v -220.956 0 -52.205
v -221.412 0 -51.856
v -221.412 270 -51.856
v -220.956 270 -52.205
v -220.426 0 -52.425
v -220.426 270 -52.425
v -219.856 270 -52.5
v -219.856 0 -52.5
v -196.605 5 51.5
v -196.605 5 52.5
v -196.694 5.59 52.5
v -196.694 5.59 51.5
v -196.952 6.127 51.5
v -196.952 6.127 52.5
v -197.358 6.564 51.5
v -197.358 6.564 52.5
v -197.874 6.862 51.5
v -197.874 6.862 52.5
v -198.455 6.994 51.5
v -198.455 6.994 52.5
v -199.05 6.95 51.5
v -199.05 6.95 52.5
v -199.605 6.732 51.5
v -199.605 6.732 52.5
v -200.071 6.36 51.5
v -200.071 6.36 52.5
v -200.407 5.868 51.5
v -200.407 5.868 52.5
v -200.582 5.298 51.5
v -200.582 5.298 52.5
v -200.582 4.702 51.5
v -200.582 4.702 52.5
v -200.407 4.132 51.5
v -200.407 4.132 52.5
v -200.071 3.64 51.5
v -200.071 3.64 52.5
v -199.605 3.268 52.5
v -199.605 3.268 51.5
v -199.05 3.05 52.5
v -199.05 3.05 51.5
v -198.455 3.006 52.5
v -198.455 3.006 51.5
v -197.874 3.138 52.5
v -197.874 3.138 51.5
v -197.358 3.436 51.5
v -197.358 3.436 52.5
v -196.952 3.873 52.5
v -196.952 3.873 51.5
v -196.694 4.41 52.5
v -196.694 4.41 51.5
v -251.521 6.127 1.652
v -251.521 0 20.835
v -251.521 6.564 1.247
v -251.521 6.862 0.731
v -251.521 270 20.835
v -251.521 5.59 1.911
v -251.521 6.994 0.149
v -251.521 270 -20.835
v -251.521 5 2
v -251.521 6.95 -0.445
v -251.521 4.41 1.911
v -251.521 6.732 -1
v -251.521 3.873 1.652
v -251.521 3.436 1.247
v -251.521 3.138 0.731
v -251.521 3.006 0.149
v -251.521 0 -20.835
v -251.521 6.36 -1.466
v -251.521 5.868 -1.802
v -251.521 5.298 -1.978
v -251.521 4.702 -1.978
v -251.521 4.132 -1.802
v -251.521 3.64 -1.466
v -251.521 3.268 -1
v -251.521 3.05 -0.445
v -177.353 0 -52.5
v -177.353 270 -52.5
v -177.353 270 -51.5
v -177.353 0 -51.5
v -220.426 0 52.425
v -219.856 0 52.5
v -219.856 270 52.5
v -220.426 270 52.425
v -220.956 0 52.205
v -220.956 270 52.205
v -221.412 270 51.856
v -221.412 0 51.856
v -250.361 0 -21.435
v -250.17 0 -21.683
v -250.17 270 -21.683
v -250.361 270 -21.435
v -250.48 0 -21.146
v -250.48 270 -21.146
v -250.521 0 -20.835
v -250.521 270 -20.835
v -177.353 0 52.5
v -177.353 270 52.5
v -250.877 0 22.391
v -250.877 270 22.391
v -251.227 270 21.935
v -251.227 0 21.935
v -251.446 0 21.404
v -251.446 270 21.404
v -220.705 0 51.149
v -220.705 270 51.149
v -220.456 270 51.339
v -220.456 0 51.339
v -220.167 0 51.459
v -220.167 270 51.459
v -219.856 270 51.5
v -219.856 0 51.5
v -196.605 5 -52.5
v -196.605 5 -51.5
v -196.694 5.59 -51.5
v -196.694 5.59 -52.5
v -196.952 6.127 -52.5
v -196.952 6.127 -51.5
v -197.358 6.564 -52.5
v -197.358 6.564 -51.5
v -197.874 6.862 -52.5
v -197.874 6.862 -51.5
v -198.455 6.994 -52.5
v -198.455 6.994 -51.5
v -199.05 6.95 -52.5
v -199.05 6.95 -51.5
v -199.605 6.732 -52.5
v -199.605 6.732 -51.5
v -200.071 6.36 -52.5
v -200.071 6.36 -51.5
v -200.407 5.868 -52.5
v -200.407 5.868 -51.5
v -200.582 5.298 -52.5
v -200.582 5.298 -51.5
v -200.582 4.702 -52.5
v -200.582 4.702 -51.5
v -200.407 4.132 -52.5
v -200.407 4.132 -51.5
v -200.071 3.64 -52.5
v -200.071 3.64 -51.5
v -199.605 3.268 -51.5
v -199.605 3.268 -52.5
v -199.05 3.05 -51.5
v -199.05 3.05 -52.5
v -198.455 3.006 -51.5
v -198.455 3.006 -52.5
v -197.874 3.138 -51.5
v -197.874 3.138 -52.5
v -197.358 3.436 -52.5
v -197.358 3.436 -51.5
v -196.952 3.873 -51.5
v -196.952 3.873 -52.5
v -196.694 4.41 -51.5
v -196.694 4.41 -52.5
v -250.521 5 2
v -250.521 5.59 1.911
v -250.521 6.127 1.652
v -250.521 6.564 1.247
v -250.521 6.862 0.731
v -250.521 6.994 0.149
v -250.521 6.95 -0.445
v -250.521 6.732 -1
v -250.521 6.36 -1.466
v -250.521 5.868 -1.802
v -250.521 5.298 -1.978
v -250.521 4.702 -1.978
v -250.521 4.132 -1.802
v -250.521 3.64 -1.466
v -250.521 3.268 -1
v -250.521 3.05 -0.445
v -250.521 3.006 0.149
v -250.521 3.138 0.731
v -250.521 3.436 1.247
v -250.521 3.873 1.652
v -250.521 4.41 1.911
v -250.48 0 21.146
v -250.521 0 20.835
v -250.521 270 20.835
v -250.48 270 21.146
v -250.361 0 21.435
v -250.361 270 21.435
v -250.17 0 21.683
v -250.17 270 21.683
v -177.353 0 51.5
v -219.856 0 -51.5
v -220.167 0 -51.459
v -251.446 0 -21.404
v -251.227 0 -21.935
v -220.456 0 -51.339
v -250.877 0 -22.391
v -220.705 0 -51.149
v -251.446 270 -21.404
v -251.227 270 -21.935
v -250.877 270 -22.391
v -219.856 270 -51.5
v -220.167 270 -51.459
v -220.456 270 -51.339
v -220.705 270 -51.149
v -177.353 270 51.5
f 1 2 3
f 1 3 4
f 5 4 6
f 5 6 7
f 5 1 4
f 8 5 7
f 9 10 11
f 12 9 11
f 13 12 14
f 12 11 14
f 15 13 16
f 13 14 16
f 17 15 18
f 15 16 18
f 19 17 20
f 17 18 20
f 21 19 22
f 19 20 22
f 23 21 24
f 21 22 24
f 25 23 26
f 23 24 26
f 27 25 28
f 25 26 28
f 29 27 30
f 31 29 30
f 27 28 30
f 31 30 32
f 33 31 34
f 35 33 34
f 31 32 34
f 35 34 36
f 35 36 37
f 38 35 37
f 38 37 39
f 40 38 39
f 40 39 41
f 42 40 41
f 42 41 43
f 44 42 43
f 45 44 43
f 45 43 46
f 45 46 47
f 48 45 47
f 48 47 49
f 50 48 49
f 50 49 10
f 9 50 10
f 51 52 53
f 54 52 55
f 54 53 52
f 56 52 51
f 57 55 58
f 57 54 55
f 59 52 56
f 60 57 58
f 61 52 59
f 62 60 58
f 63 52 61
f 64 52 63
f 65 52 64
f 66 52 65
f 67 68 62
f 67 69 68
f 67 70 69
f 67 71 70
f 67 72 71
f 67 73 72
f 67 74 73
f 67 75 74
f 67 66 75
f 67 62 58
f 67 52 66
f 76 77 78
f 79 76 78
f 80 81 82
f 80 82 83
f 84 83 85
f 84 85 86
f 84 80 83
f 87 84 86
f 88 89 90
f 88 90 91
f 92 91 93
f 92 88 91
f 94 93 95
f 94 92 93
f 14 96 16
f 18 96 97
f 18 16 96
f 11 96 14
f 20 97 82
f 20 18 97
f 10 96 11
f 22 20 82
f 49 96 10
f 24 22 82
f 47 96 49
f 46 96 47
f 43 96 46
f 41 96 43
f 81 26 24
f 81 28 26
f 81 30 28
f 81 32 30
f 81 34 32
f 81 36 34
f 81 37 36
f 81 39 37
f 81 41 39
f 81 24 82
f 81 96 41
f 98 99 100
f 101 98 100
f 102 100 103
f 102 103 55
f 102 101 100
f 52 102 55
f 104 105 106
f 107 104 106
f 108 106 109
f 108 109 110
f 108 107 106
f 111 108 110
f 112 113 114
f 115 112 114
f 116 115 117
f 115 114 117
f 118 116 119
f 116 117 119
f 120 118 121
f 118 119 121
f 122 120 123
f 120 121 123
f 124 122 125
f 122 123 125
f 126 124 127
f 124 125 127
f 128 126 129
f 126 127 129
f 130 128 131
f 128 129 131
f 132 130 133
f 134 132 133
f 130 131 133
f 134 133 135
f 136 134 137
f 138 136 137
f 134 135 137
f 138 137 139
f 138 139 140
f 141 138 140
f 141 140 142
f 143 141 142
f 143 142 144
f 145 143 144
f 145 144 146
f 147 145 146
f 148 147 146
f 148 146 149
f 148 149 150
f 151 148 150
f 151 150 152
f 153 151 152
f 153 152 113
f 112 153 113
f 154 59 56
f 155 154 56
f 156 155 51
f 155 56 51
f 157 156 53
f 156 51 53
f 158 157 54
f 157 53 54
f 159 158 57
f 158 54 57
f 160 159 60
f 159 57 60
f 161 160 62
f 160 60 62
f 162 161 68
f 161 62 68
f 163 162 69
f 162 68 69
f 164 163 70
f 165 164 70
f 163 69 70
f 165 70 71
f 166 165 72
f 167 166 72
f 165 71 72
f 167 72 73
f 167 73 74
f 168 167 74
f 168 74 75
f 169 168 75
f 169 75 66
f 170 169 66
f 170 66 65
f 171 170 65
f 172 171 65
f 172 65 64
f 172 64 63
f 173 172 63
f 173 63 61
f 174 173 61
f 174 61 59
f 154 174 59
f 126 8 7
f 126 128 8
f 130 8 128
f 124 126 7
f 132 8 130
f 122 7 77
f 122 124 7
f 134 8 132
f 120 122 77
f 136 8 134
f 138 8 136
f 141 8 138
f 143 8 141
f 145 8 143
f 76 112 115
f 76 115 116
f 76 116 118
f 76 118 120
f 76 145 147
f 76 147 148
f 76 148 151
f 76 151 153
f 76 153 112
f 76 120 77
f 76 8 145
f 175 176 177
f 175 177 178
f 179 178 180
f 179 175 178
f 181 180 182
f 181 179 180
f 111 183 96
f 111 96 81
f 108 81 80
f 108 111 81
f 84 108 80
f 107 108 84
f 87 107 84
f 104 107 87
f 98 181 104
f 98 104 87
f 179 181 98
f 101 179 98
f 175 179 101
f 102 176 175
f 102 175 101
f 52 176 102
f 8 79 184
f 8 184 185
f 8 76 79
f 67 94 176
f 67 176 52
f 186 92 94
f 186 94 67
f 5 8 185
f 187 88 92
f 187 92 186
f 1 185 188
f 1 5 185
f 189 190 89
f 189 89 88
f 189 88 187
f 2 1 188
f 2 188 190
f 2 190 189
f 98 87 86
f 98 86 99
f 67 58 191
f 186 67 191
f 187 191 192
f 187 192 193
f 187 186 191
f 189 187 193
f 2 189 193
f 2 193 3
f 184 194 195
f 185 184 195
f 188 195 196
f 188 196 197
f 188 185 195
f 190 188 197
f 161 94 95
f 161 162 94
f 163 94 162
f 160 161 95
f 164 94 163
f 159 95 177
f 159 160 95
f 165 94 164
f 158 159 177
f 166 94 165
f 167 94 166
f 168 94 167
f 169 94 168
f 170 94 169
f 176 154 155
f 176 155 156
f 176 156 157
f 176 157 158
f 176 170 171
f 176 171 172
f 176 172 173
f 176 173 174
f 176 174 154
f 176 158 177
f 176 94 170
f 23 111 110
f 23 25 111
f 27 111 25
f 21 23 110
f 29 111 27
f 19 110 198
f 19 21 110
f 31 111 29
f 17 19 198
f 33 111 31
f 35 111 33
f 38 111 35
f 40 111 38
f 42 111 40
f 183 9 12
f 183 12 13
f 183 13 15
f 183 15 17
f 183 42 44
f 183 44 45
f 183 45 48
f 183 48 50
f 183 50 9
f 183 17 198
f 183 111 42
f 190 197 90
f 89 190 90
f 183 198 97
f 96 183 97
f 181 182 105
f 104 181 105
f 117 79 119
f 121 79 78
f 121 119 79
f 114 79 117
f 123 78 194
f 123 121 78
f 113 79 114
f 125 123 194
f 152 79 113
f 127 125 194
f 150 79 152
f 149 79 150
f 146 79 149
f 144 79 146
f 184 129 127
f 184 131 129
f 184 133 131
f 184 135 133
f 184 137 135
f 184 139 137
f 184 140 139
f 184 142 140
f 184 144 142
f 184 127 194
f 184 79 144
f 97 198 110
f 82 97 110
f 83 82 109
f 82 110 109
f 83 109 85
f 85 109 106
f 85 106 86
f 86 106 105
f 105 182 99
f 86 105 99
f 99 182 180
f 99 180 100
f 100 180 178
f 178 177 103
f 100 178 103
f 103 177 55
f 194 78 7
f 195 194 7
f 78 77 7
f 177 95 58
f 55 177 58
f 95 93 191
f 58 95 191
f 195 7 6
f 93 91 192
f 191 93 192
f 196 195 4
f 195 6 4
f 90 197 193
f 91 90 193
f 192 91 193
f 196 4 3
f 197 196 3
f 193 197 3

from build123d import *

# Parameters (mm, degrees)
SM_BASE_FLANGE_1_DEPTH = 270
SKETCH_2_R             = 2
CUT_EXTRUDE_1_DEPTH    = 130
SKETCH_3_R             = 2
CUT_EXTRUDE_2_DEPTH    = 130


# Sheet-metal steps are written as plain solids
with BuildPart() as part:
    # Sketch 1 → Базовая кромка1 (new body)
    with BuildSketch(Plane(origin=(0, 0, 0), x_dir=(1, 0, 0), z_dir=(0, 1, 0))):
        with BuildLine():
            Line((-177.353282485, 51.5), (-219.85622621, 51.5))
            ThreePointArc((-219.85622621, 51.5), (-220.315446329, 51.408655439), (-220.704754348, 51.148528137))
            Line((-220.704754348, 51.148528137), (-250.16981216, 21.683470325))
            ThreePointArc((-250.16981216, 21.683470325), (-250.429939462, 21.294162306), (-250.521284023, 20.834942187))
            Line((-250.521284023, 20.834942187), (-250.521284023, -20.834942187))
            ThreePointArc((-250.521284023, -20.834942187), (-250.429939462, -21.294162306), (-250.16981216, -21.683470325))
            Line((-250.16981216, -21.683470325), (-220.704754348, -51.148528137))
            ThreePointArc((-220.704754348, -51.148528137), (-220.315446329, -51.408655439), (-219.85622621, -51.5))
            Line((-219.85622621, -51.5), (-177.353282485, -51.5))
            Line((-177.353282485, -51.5), (-177.353282485, -52.5))
            Line((-177.353282485, -52.5), (-219.85622621, -52.5))
            ThreePointArc((-219.85622621, -52.5), (-220.698129761, -52.332534972), (-221.411861129, -51.855634919))
            Line((-221.411861129, -51.855634919), (-250.876918941, -22.390577106))
            ThreePointArc((-250.876918941, -22.390577106), (-251.353818994, -21.676845739), (-251.521284023, -20.834942187))
            Line((-251.521284023, -20.834942187), (-251.521284023, 20.834942187))
            ThreePointArc((-251.521284023, 20.834942187), (-251.353818994, 21.676845739), (-250.876918941, 22.390577106))
            Line((-250.876918941, 22.390577106), (-221.411861129, 51.855634919))
            ThreePointArc((-221.411861129, 51.855634919), (-220.698129761, 52.332534972), (-219.85622621, 52.5))
            Line((-219.85622621, 52.5), (-177.353282485, 52.5))
            Line((-177.353282485, 52.5), (-177.353282485, 51.5))
        make_face()
    extrude(amount=SM_BASE_FLANGE_1_DEPTH)

    # Эскиз2 → Вырез-Вытянуть1 (cut)
    with BuildSketch(Plane.XY.offset(52.5)):
        with Locations((-198.604754348, 5)):
            Circle(SKETCH_2_R)
    extrude(amount=-CUT_EXTRUDE_1_DEPTH, mode=Mode.SUBTRACT)

    # Эскиз3 → Вырез-Вытянуть2 (cut)
    with BuildSketch(Plane.ZY.offset(251.521284023)):
        with Locations((0, 5)):
            Circle(SKETCH_3_R)
    extrude(amount=-CUT_EXTRUDE_2_DEPTH, mode=Mode.SUBTRACT)


solid = part.part
